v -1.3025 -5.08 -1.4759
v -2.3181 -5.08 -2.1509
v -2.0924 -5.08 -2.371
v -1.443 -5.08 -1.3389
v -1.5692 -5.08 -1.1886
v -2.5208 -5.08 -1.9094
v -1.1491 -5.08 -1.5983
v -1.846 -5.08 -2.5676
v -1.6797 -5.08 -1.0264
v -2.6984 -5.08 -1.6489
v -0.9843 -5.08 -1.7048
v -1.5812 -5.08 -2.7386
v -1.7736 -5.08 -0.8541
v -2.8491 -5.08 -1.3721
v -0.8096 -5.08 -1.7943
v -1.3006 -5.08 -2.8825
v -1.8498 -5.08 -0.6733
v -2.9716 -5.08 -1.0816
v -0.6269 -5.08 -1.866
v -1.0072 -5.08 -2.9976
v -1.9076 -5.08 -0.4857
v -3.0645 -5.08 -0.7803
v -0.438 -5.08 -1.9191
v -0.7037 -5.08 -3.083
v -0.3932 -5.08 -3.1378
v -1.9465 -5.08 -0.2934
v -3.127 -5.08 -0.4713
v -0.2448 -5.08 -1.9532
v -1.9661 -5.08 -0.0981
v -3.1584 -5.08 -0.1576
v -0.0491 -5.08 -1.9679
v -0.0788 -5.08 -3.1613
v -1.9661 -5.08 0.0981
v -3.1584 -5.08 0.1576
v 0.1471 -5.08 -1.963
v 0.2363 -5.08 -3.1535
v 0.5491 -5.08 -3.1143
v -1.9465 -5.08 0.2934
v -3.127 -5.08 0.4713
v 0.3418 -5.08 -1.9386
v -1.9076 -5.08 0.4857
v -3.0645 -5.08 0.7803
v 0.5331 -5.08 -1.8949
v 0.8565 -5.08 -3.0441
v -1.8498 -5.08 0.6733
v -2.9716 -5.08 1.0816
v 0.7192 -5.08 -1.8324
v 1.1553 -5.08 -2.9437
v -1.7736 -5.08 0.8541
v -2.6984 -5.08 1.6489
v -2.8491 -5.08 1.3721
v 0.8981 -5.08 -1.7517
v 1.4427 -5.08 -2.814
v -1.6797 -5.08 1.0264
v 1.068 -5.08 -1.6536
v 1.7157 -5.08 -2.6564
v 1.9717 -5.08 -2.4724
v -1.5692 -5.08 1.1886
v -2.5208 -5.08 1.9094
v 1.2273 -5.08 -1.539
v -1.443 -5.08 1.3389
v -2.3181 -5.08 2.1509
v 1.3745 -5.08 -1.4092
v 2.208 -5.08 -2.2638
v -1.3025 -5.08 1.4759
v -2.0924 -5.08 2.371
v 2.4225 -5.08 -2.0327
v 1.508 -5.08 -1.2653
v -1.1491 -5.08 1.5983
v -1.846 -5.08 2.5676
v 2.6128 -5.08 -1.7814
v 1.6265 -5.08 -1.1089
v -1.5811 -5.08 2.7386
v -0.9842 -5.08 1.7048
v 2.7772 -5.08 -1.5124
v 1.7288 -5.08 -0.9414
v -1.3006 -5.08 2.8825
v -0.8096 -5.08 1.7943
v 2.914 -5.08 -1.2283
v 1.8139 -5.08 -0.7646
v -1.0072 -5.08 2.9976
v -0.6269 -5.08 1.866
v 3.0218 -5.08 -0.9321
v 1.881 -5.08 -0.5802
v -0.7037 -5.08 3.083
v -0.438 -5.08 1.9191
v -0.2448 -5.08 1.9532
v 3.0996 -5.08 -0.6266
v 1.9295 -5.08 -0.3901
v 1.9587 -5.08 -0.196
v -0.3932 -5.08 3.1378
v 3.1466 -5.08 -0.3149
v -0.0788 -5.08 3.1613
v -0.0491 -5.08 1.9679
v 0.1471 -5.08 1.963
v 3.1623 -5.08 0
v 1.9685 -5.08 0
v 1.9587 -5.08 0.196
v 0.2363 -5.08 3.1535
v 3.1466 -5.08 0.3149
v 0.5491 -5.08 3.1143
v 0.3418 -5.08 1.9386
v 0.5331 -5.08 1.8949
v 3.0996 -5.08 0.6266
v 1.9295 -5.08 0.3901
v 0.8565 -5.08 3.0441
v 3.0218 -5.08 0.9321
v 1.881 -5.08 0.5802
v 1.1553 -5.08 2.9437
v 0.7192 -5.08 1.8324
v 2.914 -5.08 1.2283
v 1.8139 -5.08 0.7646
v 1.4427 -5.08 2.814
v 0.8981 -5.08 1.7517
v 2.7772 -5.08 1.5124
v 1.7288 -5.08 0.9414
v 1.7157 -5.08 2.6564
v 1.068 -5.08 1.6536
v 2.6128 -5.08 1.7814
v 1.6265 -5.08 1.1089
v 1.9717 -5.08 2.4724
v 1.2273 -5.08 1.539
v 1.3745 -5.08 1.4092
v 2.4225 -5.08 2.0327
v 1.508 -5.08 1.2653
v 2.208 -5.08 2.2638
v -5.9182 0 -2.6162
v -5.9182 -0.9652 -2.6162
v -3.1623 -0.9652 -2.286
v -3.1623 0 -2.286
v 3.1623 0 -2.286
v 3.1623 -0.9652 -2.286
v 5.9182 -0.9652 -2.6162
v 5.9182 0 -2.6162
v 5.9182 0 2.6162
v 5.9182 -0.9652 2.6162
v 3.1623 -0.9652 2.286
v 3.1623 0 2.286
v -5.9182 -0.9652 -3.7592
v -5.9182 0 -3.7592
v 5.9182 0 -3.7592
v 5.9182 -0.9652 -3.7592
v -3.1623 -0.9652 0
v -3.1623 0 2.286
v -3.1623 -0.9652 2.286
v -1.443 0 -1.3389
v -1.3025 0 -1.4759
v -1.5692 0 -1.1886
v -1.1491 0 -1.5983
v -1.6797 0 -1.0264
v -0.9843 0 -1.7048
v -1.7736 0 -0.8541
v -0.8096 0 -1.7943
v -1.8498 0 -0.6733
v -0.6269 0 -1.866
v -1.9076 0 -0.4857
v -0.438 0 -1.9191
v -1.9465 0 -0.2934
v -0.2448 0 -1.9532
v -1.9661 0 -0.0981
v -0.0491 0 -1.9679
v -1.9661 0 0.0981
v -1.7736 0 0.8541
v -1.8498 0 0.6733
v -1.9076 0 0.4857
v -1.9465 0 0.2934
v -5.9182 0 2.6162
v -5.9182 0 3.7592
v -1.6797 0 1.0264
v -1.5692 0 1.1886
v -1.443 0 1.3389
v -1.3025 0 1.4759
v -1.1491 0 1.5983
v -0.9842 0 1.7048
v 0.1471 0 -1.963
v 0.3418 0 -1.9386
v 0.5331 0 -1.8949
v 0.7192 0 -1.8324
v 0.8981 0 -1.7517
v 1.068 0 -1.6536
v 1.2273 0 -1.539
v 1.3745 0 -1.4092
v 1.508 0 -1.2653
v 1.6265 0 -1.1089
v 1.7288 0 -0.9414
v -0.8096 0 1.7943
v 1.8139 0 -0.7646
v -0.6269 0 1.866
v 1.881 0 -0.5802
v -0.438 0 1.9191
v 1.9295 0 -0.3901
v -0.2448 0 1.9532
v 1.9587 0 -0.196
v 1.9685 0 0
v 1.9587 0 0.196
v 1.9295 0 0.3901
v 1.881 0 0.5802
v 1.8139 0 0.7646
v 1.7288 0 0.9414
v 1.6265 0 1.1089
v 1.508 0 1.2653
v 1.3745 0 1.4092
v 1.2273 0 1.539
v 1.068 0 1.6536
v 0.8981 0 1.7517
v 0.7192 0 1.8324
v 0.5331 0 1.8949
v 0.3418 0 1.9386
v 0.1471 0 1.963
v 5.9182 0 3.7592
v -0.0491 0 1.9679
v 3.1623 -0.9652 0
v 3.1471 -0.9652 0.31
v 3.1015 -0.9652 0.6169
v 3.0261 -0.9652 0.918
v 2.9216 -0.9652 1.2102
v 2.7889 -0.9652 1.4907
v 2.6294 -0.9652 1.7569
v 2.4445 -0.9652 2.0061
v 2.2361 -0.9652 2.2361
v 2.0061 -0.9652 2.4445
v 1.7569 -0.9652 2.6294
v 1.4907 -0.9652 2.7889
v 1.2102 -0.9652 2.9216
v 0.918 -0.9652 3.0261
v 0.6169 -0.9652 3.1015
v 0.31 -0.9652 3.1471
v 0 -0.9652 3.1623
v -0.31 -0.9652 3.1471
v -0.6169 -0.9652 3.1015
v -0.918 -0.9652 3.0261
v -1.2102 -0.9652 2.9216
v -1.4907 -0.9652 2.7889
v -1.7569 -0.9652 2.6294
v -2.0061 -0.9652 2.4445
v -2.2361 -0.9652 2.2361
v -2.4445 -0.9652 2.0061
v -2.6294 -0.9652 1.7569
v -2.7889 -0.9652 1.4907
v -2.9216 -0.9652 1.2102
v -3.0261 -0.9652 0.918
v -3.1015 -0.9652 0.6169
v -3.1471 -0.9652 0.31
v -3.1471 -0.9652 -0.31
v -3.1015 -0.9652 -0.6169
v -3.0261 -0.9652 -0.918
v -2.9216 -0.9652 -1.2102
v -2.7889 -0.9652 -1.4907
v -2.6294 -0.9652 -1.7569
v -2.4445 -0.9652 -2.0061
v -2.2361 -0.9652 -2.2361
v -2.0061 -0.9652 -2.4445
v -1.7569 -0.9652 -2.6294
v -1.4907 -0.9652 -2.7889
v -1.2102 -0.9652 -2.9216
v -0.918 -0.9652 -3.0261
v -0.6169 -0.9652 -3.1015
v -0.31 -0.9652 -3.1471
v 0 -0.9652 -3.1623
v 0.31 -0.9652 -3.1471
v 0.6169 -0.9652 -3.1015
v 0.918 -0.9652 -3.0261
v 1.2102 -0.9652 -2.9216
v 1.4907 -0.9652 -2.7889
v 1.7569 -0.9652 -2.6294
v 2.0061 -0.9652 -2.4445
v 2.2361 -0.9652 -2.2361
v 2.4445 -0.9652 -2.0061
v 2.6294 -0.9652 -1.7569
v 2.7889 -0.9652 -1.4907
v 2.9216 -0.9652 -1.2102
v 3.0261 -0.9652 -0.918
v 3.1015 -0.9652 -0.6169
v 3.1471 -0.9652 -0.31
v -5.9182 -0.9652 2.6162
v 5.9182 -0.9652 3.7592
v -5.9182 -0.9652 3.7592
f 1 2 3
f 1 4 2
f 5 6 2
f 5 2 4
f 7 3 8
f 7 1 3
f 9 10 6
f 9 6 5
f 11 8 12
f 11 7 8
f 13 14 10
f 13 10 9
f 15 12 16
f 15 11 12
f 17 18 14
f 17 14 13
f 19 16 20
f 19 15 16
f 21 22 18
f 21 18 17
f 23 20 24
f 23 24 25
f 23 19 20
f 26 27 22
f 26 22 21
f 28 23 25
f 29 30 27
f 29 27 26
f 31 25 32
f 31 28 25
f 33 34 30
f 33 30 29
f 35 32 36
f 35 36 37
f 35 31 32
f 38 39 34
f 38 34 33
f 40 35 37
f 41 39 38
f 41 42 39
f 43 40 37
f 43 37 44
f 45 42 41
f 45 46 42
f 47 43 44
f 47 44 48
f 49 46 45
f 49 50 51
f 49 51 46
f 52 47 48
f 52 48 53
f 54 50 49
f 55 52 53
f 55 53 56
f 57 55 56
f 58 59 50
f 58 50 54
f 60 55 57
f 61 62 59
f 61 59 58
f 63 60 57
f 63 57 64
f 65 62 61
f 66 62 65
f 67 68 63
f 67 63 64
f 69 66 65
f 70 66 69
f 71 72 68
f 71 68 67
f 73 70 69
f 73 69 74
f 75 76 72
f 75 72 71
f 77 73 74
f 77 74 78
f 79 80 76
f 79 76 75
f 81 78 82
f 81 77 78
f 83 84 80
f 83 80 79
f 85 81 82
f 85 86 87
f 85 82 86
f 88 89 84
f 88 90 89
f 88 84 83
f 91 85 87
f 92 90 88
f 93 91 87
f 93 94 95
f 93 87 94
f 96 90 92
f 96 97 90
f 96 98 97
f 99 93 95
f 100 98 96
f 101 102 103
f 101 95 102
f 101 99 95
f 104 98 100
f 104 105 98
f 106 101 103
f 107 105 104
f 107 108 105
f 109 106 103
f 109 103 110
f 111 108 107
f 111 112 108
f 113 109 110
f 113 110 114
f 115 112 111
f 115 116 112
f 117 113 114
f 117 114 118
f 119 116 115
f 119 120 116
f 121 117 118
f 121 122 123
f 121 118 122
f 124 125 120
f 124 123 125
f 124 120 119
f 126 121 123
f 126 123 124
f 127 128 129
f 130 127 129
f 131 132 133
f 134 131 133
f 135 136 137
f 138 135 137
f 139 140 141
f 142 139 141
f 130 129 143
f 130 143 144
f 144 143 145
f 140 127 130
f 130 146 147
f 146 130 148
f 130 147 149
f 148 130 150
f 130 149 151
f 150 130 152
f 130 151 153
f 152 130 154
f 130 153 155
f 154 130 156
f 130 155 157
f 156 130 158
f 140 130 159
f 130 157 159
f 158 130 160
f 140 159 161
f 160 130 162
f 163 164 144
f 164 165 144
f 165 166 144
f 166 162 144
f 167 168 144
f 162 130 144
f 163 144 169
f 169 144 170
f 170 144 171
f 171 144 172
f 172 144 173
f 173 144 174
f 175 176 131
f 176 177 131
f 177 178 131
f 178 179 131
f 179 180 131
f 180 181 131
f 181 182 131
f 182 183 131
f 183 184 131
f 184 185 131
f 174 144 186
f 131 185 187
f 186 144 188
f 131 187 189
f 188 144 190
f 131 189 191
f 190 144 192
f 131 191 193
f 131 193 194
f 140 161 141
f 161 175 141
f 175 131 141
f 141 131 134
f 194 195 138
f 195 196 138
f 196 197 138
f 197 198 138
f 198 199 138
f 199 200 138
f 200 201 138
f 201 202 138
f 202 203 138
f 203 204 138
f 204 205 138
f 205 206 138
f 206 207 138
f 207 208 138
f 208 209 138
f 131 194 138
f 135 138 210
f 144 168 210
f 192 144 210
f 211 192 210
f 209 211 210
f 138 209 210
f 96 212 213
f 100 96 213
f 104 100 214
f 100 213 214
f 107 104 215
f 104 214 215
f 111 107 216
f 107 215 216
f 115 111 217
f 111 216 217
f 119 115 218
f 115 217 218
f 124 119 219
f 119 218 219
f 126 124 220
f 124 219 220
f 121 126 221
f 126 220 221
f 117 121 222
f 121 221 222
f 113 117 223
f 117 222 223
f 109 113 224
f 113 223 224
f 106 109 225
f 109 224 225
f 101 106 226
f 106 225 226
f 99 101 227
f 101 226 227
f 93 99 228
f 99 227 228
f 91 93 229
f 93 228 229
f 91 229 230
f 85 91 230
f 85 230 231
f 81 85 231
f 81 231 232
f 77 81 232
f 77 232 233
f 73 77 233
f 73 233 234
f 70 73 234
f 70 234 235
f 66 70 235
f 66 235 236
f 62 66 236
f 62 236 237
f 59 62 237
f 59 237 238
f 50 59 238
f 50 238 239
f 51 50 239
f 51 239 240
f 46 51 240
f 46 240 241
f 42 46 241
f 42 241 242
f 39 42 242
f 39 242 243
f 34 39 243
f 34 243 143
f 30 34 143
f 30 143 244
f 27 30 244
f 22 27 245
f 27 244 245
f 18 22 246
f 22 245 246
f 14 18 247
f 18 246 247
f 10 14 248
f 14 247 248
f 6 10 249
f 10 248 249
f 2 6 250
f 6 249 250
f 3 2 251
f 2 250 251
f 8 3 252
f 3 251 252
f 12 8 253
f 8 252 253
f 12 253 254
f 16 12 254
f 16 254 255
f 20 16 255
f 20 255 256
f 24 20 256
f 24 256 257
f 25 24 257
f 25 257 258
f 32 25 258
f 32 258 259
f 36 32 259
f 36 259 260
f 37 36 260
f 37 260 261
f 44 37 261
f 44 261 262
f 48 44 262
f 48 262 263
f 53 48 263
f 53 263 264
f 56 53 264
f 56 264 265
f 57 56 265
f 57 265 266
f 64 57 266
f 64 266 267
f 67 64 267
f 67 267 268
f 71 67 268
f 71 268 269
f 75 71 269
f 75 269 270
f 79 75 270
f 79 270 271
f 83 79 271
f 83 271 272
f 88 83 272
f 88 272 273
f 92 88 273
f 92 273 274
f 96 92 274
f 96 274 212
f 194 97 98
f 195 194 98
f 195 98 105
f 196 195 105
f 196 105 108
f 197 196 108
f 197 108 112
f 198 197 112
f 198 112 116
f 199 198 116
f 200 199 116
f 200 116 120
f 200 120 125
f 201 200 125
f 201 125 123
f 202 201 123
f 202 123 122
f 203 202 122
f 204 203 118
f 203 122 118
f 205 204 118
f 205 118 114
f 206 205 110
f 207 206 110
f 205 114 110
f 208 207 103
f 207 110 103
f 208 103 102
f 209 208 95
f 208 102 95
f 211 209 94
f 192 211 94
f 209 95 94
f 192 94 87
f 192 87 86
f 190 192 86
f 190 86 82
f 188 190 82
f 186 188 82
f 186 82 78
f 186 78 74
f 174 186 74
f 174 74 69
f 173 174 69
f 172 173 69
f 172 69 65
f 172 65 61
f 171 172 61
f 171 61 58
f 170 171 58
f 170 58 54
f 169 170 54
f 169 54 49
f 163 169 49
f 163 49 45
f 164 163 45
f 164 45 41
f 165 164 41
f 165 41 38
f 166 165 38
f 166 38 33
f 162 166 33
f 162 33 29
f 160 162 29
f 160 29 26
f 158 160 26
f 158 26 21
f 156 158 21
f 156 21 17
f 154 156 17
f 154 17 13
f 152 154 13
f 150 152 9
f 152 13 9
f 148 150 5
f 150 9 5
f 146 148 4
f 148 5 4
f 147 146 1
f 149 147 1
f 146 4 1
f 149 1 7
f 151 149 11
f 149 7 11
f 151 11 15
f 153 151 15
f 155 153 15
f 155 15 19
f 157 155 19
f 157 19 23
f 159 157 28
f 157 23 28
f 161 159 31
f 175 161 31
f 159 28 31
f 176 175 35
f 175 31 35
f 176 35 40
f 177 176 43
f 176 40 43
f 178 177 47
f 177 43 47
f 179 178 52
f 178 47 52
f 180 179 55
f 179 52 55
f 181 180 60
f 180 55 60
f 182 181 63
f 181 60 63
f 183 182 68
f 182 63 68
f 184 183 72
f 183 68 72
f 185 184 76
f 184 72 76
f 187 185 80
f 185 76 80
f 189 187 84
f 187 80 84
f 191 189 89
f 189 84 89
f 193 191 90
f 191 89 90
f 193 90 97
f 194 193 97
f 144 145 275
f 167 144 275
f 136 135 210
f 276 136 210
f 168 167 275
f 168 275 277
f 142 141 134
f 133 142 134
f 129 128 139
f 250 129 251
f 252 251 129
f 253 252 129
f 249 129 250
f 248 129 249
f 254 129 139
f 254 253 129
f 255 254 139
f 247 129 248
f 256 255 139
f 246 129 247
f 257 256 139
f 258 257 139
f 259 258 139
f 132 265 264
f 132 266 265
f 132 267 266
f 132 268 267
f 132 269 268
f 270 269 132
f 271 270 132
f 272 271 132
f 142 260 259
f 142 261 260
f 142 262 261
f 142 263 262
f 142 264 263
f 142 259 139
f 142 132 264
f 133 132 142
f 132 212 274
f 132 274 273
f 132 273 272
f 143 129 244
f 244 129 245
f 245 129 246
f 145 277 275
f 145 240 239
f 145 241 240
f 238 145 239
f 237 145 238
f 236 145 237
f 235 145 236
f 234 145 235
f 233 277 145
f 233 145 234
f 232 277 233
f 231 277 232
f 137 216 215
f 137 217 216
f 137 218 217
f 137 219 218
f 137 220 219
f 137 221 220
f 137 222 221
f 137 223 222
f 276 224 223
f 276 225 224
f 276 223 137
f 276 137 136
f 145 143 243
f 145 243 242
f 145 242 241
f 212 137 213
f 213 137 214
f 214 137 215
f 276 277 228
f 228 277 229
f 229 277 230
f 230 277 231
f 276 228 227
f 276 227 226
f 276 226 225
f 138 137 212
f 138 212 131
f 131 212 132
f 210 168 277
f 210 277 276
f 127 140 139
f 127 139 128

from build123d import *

# Parameters (mm, degrees)
F0_W     = 11.8364
F0_H     = 7.5184
F1_DEPTH = 0.9652
F2_R     = 3.1623
F3_DEPTH = 4.1148
F4_R     = 1.9685
F5_DEPTH = 5.081
F7_DEPTH = 0.9662


with BuildPart() as f1:
    # F0 (on Front) → F1 (new body)
    with BuildSketch(Plane.XZ):
        Rectangle(F0_W, F0_H)
    extrude(amount=F1_DEPTH)

    # F2 (on face) → F3 (join)
    with BuildSketch(Plane.XZ.offset(0.9652)):
        Circle(F2_R)
    extrude(amount=F3_DEPTH)

    # F4 (on face) → F5 (cut, through all)
    with BuildSketch(Plane.XZ.offset(5.08)):
        Circle(F4_R)
    extrude(amount=-F5_DEPTH, mode=Mode.SUBTRACT)

    # F6 (on face) → F7 (cut, through all)
    with BuildSketch(Plane.XZ.offset(0.9652)):
        Polygon((-3.1623, -2.286), (-3.1623, 0), (-3.1623, 2.286), (-5.9182, 2.6162), (-5.9182, -2.6162), align=None)
        Polygon((3.1623, 2.286), (3.1623, 0), (3.1623, -2.286), (5.9182, -2.6162), (5.9182, 2.6162), align=None)
    extrude(amount=-F7_DEPTH, mode=Mode.SUBTRACT)


solid = f1.part
